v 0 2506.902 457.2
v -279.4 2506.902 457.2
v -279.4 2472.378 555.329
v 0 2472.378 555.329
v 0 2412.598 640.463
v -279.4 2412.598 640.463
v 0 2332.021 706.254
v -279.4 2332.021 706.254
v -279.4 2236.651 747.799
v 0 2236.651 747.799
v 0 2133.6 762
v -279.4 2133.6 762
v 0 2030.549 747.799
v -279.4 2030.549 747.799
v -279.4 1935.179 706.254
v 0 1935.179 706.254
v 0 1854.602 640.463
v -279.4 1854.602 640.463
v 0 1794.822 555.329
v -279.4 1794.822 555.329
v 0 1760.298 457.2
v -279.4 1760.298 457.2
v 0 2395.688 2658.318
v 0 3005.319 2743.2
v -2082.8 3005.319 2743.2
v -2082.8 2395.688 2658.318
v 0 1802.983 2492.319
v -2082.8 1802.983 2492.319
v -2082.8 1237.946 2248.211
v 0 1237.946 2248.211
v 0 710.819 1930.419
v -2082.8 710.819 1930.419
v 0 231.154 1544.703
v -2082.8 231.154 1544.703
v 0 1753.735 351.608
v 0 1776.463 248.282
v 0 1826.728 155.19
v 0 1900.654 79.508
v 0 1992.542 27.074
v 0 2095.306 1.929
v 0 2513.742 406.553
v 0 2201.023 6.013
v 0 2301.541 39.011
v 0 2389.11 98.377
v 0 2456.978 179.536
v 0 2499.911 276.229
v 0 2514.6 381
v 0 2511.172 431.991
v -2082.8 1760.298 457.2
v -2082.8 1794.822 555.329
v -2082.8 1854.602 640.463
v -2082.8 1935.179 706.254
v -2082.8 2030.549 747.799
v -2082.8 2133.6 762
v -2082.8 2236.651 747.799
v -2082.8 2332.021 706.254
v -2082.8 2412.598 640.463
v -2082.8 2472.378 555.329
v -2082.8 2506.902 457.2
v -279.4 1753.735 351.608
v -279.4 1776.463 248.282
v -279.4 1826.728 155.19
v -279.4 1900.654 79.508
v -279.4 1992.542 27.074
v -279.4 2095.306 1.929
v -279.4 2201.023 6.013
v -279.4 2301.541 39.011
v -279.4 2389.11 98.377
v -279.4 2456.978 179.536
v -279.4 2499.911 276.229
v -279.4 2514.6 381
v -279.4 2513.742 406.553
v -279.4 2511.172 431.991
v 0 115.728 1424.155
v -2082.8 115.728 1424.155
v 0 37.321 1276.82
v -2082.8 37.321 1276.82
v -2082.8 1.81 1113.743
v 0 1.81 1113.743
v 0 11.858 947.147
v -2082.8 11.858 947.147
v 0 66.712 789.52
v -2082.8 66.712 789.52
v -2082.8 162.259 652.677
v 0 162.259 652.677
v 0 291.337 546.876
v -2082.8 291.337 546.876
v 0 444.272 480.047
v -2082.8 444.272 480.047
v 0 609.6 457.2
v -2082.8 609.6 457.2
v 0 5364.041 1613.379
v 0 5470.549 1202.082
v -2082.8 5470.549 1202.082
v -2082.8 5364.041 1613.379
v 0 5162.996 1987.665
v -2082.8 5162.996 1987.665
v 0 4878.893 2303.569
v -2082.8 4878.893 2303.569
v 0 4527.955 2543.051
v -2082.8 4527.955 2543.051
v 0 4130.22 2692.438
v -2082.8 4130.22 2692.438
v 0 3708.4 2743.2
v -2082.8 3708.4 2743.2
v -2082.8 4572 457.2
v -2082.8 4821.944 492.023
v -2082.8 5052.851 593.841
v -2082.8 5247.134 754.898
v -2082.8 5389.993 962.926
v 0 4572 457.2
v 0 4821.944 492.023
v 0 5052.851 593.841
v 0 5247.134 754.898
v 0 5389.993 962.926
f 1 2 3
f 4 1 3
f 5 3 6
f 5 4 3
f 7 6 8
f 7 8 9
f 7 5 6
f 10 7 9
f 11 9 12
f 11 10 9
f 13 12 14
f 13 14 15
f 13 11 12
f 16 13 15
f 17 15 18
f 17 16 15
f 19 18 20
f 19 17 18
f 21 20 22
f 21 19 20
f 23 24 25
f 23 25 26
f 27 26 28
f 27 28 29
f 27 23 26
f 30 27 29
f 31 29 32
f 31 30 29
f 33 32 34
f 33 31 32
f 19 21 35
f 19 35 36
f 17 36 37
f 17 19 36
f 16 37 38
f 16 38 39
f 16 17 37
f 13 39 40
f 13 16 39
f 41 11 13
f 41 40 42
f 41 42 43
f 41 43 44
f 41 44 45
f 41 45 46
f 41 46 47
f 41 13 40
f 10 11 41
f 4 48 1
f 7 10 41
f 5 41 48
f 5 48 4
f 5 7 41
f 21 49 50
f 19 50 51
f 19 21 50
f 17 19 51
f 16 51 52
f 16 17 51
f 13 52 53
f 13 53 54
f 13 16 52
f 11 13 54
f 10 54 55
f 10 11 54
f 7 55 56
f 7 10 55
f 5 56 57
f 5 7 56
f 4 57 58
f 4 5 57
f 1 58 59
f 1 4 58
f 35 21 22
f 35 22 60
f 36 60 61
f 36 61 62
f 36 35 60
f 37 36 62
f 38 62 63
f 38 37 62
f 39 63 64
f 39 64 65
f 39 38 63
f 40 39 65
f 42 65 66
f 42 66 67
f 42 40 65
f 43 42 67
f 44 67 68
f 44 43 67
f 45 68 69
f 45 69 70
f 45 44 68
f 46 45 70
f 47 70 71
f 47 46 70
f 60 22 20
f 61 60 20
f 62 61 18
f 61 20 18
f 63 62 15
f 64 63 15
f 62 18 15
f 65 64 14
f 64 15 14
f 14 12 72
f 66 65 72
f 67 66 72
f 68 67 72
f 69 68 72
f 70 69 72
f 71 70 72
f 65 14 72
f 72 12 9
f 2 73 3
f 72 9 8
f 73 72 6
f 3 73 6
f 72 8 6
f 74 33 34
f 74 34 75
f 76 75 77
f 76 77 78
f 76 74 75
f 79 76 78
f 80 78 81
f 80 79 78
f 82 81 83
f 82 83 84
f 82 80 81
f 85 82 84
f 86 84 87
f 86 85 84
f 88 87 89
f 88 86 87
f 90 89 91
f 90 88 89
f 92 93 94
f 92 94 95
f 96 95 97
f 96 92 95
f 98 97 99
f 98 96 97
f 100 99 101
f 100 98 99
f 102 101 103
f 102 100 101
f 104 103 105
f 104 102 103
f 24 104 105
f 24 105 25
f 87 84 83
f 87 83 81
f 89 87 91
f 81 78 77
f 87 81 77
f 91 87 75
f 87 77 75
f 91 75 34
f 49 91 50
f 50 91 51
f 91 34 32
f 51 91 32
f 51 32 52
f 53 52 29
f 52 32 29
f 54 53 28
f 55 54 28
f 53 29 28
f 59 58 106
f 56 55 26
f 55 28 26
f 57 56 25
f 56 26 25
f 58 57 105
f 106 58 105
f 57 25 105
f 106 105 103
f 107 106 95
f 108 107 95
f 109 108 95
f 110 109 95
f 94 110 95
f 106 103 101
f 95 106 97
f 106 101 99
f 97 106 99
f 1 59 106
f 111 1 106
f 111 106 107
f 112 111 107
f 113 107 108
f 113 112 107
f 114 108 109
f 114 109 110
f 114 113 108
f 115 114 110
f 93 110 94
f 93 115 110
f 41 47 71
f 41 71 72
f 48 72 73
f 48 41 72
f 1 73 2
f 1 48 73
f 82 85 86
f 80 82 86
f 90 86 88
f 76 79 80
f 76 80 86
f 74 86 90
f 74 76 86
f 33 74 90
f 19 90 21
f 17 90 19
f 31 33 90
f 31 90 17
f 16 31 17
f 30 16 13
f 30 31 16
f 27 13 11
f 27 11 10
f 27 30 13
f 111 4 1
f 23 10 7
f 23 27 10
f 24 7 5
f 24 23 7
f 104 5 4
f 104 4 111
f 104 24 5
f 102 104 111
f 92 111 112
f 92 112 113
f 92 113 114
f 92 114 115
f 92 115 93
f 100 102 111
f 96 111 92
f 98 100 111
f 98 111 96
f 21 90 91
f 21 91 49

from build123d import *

# Parameters (mm, degrees)
F1_DEPTH = 2082.8
F2_DEPTH = 279.4


with BuildPart() as f1:
    # F0 (on Right) → F1 (new body)
    with BuildSketch(Plane.YZ):
        with BuildLine():
            ThreePointArc((5470.549464, 1202.082389), (4878.892869, 2303.568575), (3708.4, 2743.2))
            Line((3708.4, 2743.2), (3005.318663, 2743.2))
            ThreePointArc((3005.318663, 2743.2), (1516.351794, 2379.784171), (231.154358, 1544.702768))
            ThreePointArc((231.154358, 1544.702768), (33.864954, 866.447021), (609.6, 457.2))
            Line((609.6, 457.2), (1760.297763, 457.2))
            ThreePointArc((1760.297763, 457.2), (2133.6, 762), (2506.902237, 457.2))
            Line((2506.902237, 457.2), (4572, 457.2))
            ThreePointArc((4572, 457.2), (5155.575383, 667.634708), (5470.549464, 1202.082389))
        make_face()
    extrude(amount=-F1_DEPTH)


with BuildPart() as f2:
    # F0 (on Right) → F2 (new body)
    with BuildSketch(Plane.YZ):
        with BuildLine():
            Line((1760.297763, 457.2), (2506.902237, 457.2))
            ThreePointArc((2506.902237, 457.2), (2133.6, 762), (1760.297763, 457.2))
        make_face()
        with BuildLine():
            ThreePointArc((2514.6, 381), (2512.670674, 419.293915), (2506.902237, 457.2))
            Line((2506.902237, 457.2), (1760.297763, 457.2))
            ThreePointArc((1760.297763, 457.2), (2095.306085, 1.929326), (2514.6, 381))
        make_face()
    extrude(amount=-F2_DEPTH)


solid = Compound([f1.part, f2.part])
